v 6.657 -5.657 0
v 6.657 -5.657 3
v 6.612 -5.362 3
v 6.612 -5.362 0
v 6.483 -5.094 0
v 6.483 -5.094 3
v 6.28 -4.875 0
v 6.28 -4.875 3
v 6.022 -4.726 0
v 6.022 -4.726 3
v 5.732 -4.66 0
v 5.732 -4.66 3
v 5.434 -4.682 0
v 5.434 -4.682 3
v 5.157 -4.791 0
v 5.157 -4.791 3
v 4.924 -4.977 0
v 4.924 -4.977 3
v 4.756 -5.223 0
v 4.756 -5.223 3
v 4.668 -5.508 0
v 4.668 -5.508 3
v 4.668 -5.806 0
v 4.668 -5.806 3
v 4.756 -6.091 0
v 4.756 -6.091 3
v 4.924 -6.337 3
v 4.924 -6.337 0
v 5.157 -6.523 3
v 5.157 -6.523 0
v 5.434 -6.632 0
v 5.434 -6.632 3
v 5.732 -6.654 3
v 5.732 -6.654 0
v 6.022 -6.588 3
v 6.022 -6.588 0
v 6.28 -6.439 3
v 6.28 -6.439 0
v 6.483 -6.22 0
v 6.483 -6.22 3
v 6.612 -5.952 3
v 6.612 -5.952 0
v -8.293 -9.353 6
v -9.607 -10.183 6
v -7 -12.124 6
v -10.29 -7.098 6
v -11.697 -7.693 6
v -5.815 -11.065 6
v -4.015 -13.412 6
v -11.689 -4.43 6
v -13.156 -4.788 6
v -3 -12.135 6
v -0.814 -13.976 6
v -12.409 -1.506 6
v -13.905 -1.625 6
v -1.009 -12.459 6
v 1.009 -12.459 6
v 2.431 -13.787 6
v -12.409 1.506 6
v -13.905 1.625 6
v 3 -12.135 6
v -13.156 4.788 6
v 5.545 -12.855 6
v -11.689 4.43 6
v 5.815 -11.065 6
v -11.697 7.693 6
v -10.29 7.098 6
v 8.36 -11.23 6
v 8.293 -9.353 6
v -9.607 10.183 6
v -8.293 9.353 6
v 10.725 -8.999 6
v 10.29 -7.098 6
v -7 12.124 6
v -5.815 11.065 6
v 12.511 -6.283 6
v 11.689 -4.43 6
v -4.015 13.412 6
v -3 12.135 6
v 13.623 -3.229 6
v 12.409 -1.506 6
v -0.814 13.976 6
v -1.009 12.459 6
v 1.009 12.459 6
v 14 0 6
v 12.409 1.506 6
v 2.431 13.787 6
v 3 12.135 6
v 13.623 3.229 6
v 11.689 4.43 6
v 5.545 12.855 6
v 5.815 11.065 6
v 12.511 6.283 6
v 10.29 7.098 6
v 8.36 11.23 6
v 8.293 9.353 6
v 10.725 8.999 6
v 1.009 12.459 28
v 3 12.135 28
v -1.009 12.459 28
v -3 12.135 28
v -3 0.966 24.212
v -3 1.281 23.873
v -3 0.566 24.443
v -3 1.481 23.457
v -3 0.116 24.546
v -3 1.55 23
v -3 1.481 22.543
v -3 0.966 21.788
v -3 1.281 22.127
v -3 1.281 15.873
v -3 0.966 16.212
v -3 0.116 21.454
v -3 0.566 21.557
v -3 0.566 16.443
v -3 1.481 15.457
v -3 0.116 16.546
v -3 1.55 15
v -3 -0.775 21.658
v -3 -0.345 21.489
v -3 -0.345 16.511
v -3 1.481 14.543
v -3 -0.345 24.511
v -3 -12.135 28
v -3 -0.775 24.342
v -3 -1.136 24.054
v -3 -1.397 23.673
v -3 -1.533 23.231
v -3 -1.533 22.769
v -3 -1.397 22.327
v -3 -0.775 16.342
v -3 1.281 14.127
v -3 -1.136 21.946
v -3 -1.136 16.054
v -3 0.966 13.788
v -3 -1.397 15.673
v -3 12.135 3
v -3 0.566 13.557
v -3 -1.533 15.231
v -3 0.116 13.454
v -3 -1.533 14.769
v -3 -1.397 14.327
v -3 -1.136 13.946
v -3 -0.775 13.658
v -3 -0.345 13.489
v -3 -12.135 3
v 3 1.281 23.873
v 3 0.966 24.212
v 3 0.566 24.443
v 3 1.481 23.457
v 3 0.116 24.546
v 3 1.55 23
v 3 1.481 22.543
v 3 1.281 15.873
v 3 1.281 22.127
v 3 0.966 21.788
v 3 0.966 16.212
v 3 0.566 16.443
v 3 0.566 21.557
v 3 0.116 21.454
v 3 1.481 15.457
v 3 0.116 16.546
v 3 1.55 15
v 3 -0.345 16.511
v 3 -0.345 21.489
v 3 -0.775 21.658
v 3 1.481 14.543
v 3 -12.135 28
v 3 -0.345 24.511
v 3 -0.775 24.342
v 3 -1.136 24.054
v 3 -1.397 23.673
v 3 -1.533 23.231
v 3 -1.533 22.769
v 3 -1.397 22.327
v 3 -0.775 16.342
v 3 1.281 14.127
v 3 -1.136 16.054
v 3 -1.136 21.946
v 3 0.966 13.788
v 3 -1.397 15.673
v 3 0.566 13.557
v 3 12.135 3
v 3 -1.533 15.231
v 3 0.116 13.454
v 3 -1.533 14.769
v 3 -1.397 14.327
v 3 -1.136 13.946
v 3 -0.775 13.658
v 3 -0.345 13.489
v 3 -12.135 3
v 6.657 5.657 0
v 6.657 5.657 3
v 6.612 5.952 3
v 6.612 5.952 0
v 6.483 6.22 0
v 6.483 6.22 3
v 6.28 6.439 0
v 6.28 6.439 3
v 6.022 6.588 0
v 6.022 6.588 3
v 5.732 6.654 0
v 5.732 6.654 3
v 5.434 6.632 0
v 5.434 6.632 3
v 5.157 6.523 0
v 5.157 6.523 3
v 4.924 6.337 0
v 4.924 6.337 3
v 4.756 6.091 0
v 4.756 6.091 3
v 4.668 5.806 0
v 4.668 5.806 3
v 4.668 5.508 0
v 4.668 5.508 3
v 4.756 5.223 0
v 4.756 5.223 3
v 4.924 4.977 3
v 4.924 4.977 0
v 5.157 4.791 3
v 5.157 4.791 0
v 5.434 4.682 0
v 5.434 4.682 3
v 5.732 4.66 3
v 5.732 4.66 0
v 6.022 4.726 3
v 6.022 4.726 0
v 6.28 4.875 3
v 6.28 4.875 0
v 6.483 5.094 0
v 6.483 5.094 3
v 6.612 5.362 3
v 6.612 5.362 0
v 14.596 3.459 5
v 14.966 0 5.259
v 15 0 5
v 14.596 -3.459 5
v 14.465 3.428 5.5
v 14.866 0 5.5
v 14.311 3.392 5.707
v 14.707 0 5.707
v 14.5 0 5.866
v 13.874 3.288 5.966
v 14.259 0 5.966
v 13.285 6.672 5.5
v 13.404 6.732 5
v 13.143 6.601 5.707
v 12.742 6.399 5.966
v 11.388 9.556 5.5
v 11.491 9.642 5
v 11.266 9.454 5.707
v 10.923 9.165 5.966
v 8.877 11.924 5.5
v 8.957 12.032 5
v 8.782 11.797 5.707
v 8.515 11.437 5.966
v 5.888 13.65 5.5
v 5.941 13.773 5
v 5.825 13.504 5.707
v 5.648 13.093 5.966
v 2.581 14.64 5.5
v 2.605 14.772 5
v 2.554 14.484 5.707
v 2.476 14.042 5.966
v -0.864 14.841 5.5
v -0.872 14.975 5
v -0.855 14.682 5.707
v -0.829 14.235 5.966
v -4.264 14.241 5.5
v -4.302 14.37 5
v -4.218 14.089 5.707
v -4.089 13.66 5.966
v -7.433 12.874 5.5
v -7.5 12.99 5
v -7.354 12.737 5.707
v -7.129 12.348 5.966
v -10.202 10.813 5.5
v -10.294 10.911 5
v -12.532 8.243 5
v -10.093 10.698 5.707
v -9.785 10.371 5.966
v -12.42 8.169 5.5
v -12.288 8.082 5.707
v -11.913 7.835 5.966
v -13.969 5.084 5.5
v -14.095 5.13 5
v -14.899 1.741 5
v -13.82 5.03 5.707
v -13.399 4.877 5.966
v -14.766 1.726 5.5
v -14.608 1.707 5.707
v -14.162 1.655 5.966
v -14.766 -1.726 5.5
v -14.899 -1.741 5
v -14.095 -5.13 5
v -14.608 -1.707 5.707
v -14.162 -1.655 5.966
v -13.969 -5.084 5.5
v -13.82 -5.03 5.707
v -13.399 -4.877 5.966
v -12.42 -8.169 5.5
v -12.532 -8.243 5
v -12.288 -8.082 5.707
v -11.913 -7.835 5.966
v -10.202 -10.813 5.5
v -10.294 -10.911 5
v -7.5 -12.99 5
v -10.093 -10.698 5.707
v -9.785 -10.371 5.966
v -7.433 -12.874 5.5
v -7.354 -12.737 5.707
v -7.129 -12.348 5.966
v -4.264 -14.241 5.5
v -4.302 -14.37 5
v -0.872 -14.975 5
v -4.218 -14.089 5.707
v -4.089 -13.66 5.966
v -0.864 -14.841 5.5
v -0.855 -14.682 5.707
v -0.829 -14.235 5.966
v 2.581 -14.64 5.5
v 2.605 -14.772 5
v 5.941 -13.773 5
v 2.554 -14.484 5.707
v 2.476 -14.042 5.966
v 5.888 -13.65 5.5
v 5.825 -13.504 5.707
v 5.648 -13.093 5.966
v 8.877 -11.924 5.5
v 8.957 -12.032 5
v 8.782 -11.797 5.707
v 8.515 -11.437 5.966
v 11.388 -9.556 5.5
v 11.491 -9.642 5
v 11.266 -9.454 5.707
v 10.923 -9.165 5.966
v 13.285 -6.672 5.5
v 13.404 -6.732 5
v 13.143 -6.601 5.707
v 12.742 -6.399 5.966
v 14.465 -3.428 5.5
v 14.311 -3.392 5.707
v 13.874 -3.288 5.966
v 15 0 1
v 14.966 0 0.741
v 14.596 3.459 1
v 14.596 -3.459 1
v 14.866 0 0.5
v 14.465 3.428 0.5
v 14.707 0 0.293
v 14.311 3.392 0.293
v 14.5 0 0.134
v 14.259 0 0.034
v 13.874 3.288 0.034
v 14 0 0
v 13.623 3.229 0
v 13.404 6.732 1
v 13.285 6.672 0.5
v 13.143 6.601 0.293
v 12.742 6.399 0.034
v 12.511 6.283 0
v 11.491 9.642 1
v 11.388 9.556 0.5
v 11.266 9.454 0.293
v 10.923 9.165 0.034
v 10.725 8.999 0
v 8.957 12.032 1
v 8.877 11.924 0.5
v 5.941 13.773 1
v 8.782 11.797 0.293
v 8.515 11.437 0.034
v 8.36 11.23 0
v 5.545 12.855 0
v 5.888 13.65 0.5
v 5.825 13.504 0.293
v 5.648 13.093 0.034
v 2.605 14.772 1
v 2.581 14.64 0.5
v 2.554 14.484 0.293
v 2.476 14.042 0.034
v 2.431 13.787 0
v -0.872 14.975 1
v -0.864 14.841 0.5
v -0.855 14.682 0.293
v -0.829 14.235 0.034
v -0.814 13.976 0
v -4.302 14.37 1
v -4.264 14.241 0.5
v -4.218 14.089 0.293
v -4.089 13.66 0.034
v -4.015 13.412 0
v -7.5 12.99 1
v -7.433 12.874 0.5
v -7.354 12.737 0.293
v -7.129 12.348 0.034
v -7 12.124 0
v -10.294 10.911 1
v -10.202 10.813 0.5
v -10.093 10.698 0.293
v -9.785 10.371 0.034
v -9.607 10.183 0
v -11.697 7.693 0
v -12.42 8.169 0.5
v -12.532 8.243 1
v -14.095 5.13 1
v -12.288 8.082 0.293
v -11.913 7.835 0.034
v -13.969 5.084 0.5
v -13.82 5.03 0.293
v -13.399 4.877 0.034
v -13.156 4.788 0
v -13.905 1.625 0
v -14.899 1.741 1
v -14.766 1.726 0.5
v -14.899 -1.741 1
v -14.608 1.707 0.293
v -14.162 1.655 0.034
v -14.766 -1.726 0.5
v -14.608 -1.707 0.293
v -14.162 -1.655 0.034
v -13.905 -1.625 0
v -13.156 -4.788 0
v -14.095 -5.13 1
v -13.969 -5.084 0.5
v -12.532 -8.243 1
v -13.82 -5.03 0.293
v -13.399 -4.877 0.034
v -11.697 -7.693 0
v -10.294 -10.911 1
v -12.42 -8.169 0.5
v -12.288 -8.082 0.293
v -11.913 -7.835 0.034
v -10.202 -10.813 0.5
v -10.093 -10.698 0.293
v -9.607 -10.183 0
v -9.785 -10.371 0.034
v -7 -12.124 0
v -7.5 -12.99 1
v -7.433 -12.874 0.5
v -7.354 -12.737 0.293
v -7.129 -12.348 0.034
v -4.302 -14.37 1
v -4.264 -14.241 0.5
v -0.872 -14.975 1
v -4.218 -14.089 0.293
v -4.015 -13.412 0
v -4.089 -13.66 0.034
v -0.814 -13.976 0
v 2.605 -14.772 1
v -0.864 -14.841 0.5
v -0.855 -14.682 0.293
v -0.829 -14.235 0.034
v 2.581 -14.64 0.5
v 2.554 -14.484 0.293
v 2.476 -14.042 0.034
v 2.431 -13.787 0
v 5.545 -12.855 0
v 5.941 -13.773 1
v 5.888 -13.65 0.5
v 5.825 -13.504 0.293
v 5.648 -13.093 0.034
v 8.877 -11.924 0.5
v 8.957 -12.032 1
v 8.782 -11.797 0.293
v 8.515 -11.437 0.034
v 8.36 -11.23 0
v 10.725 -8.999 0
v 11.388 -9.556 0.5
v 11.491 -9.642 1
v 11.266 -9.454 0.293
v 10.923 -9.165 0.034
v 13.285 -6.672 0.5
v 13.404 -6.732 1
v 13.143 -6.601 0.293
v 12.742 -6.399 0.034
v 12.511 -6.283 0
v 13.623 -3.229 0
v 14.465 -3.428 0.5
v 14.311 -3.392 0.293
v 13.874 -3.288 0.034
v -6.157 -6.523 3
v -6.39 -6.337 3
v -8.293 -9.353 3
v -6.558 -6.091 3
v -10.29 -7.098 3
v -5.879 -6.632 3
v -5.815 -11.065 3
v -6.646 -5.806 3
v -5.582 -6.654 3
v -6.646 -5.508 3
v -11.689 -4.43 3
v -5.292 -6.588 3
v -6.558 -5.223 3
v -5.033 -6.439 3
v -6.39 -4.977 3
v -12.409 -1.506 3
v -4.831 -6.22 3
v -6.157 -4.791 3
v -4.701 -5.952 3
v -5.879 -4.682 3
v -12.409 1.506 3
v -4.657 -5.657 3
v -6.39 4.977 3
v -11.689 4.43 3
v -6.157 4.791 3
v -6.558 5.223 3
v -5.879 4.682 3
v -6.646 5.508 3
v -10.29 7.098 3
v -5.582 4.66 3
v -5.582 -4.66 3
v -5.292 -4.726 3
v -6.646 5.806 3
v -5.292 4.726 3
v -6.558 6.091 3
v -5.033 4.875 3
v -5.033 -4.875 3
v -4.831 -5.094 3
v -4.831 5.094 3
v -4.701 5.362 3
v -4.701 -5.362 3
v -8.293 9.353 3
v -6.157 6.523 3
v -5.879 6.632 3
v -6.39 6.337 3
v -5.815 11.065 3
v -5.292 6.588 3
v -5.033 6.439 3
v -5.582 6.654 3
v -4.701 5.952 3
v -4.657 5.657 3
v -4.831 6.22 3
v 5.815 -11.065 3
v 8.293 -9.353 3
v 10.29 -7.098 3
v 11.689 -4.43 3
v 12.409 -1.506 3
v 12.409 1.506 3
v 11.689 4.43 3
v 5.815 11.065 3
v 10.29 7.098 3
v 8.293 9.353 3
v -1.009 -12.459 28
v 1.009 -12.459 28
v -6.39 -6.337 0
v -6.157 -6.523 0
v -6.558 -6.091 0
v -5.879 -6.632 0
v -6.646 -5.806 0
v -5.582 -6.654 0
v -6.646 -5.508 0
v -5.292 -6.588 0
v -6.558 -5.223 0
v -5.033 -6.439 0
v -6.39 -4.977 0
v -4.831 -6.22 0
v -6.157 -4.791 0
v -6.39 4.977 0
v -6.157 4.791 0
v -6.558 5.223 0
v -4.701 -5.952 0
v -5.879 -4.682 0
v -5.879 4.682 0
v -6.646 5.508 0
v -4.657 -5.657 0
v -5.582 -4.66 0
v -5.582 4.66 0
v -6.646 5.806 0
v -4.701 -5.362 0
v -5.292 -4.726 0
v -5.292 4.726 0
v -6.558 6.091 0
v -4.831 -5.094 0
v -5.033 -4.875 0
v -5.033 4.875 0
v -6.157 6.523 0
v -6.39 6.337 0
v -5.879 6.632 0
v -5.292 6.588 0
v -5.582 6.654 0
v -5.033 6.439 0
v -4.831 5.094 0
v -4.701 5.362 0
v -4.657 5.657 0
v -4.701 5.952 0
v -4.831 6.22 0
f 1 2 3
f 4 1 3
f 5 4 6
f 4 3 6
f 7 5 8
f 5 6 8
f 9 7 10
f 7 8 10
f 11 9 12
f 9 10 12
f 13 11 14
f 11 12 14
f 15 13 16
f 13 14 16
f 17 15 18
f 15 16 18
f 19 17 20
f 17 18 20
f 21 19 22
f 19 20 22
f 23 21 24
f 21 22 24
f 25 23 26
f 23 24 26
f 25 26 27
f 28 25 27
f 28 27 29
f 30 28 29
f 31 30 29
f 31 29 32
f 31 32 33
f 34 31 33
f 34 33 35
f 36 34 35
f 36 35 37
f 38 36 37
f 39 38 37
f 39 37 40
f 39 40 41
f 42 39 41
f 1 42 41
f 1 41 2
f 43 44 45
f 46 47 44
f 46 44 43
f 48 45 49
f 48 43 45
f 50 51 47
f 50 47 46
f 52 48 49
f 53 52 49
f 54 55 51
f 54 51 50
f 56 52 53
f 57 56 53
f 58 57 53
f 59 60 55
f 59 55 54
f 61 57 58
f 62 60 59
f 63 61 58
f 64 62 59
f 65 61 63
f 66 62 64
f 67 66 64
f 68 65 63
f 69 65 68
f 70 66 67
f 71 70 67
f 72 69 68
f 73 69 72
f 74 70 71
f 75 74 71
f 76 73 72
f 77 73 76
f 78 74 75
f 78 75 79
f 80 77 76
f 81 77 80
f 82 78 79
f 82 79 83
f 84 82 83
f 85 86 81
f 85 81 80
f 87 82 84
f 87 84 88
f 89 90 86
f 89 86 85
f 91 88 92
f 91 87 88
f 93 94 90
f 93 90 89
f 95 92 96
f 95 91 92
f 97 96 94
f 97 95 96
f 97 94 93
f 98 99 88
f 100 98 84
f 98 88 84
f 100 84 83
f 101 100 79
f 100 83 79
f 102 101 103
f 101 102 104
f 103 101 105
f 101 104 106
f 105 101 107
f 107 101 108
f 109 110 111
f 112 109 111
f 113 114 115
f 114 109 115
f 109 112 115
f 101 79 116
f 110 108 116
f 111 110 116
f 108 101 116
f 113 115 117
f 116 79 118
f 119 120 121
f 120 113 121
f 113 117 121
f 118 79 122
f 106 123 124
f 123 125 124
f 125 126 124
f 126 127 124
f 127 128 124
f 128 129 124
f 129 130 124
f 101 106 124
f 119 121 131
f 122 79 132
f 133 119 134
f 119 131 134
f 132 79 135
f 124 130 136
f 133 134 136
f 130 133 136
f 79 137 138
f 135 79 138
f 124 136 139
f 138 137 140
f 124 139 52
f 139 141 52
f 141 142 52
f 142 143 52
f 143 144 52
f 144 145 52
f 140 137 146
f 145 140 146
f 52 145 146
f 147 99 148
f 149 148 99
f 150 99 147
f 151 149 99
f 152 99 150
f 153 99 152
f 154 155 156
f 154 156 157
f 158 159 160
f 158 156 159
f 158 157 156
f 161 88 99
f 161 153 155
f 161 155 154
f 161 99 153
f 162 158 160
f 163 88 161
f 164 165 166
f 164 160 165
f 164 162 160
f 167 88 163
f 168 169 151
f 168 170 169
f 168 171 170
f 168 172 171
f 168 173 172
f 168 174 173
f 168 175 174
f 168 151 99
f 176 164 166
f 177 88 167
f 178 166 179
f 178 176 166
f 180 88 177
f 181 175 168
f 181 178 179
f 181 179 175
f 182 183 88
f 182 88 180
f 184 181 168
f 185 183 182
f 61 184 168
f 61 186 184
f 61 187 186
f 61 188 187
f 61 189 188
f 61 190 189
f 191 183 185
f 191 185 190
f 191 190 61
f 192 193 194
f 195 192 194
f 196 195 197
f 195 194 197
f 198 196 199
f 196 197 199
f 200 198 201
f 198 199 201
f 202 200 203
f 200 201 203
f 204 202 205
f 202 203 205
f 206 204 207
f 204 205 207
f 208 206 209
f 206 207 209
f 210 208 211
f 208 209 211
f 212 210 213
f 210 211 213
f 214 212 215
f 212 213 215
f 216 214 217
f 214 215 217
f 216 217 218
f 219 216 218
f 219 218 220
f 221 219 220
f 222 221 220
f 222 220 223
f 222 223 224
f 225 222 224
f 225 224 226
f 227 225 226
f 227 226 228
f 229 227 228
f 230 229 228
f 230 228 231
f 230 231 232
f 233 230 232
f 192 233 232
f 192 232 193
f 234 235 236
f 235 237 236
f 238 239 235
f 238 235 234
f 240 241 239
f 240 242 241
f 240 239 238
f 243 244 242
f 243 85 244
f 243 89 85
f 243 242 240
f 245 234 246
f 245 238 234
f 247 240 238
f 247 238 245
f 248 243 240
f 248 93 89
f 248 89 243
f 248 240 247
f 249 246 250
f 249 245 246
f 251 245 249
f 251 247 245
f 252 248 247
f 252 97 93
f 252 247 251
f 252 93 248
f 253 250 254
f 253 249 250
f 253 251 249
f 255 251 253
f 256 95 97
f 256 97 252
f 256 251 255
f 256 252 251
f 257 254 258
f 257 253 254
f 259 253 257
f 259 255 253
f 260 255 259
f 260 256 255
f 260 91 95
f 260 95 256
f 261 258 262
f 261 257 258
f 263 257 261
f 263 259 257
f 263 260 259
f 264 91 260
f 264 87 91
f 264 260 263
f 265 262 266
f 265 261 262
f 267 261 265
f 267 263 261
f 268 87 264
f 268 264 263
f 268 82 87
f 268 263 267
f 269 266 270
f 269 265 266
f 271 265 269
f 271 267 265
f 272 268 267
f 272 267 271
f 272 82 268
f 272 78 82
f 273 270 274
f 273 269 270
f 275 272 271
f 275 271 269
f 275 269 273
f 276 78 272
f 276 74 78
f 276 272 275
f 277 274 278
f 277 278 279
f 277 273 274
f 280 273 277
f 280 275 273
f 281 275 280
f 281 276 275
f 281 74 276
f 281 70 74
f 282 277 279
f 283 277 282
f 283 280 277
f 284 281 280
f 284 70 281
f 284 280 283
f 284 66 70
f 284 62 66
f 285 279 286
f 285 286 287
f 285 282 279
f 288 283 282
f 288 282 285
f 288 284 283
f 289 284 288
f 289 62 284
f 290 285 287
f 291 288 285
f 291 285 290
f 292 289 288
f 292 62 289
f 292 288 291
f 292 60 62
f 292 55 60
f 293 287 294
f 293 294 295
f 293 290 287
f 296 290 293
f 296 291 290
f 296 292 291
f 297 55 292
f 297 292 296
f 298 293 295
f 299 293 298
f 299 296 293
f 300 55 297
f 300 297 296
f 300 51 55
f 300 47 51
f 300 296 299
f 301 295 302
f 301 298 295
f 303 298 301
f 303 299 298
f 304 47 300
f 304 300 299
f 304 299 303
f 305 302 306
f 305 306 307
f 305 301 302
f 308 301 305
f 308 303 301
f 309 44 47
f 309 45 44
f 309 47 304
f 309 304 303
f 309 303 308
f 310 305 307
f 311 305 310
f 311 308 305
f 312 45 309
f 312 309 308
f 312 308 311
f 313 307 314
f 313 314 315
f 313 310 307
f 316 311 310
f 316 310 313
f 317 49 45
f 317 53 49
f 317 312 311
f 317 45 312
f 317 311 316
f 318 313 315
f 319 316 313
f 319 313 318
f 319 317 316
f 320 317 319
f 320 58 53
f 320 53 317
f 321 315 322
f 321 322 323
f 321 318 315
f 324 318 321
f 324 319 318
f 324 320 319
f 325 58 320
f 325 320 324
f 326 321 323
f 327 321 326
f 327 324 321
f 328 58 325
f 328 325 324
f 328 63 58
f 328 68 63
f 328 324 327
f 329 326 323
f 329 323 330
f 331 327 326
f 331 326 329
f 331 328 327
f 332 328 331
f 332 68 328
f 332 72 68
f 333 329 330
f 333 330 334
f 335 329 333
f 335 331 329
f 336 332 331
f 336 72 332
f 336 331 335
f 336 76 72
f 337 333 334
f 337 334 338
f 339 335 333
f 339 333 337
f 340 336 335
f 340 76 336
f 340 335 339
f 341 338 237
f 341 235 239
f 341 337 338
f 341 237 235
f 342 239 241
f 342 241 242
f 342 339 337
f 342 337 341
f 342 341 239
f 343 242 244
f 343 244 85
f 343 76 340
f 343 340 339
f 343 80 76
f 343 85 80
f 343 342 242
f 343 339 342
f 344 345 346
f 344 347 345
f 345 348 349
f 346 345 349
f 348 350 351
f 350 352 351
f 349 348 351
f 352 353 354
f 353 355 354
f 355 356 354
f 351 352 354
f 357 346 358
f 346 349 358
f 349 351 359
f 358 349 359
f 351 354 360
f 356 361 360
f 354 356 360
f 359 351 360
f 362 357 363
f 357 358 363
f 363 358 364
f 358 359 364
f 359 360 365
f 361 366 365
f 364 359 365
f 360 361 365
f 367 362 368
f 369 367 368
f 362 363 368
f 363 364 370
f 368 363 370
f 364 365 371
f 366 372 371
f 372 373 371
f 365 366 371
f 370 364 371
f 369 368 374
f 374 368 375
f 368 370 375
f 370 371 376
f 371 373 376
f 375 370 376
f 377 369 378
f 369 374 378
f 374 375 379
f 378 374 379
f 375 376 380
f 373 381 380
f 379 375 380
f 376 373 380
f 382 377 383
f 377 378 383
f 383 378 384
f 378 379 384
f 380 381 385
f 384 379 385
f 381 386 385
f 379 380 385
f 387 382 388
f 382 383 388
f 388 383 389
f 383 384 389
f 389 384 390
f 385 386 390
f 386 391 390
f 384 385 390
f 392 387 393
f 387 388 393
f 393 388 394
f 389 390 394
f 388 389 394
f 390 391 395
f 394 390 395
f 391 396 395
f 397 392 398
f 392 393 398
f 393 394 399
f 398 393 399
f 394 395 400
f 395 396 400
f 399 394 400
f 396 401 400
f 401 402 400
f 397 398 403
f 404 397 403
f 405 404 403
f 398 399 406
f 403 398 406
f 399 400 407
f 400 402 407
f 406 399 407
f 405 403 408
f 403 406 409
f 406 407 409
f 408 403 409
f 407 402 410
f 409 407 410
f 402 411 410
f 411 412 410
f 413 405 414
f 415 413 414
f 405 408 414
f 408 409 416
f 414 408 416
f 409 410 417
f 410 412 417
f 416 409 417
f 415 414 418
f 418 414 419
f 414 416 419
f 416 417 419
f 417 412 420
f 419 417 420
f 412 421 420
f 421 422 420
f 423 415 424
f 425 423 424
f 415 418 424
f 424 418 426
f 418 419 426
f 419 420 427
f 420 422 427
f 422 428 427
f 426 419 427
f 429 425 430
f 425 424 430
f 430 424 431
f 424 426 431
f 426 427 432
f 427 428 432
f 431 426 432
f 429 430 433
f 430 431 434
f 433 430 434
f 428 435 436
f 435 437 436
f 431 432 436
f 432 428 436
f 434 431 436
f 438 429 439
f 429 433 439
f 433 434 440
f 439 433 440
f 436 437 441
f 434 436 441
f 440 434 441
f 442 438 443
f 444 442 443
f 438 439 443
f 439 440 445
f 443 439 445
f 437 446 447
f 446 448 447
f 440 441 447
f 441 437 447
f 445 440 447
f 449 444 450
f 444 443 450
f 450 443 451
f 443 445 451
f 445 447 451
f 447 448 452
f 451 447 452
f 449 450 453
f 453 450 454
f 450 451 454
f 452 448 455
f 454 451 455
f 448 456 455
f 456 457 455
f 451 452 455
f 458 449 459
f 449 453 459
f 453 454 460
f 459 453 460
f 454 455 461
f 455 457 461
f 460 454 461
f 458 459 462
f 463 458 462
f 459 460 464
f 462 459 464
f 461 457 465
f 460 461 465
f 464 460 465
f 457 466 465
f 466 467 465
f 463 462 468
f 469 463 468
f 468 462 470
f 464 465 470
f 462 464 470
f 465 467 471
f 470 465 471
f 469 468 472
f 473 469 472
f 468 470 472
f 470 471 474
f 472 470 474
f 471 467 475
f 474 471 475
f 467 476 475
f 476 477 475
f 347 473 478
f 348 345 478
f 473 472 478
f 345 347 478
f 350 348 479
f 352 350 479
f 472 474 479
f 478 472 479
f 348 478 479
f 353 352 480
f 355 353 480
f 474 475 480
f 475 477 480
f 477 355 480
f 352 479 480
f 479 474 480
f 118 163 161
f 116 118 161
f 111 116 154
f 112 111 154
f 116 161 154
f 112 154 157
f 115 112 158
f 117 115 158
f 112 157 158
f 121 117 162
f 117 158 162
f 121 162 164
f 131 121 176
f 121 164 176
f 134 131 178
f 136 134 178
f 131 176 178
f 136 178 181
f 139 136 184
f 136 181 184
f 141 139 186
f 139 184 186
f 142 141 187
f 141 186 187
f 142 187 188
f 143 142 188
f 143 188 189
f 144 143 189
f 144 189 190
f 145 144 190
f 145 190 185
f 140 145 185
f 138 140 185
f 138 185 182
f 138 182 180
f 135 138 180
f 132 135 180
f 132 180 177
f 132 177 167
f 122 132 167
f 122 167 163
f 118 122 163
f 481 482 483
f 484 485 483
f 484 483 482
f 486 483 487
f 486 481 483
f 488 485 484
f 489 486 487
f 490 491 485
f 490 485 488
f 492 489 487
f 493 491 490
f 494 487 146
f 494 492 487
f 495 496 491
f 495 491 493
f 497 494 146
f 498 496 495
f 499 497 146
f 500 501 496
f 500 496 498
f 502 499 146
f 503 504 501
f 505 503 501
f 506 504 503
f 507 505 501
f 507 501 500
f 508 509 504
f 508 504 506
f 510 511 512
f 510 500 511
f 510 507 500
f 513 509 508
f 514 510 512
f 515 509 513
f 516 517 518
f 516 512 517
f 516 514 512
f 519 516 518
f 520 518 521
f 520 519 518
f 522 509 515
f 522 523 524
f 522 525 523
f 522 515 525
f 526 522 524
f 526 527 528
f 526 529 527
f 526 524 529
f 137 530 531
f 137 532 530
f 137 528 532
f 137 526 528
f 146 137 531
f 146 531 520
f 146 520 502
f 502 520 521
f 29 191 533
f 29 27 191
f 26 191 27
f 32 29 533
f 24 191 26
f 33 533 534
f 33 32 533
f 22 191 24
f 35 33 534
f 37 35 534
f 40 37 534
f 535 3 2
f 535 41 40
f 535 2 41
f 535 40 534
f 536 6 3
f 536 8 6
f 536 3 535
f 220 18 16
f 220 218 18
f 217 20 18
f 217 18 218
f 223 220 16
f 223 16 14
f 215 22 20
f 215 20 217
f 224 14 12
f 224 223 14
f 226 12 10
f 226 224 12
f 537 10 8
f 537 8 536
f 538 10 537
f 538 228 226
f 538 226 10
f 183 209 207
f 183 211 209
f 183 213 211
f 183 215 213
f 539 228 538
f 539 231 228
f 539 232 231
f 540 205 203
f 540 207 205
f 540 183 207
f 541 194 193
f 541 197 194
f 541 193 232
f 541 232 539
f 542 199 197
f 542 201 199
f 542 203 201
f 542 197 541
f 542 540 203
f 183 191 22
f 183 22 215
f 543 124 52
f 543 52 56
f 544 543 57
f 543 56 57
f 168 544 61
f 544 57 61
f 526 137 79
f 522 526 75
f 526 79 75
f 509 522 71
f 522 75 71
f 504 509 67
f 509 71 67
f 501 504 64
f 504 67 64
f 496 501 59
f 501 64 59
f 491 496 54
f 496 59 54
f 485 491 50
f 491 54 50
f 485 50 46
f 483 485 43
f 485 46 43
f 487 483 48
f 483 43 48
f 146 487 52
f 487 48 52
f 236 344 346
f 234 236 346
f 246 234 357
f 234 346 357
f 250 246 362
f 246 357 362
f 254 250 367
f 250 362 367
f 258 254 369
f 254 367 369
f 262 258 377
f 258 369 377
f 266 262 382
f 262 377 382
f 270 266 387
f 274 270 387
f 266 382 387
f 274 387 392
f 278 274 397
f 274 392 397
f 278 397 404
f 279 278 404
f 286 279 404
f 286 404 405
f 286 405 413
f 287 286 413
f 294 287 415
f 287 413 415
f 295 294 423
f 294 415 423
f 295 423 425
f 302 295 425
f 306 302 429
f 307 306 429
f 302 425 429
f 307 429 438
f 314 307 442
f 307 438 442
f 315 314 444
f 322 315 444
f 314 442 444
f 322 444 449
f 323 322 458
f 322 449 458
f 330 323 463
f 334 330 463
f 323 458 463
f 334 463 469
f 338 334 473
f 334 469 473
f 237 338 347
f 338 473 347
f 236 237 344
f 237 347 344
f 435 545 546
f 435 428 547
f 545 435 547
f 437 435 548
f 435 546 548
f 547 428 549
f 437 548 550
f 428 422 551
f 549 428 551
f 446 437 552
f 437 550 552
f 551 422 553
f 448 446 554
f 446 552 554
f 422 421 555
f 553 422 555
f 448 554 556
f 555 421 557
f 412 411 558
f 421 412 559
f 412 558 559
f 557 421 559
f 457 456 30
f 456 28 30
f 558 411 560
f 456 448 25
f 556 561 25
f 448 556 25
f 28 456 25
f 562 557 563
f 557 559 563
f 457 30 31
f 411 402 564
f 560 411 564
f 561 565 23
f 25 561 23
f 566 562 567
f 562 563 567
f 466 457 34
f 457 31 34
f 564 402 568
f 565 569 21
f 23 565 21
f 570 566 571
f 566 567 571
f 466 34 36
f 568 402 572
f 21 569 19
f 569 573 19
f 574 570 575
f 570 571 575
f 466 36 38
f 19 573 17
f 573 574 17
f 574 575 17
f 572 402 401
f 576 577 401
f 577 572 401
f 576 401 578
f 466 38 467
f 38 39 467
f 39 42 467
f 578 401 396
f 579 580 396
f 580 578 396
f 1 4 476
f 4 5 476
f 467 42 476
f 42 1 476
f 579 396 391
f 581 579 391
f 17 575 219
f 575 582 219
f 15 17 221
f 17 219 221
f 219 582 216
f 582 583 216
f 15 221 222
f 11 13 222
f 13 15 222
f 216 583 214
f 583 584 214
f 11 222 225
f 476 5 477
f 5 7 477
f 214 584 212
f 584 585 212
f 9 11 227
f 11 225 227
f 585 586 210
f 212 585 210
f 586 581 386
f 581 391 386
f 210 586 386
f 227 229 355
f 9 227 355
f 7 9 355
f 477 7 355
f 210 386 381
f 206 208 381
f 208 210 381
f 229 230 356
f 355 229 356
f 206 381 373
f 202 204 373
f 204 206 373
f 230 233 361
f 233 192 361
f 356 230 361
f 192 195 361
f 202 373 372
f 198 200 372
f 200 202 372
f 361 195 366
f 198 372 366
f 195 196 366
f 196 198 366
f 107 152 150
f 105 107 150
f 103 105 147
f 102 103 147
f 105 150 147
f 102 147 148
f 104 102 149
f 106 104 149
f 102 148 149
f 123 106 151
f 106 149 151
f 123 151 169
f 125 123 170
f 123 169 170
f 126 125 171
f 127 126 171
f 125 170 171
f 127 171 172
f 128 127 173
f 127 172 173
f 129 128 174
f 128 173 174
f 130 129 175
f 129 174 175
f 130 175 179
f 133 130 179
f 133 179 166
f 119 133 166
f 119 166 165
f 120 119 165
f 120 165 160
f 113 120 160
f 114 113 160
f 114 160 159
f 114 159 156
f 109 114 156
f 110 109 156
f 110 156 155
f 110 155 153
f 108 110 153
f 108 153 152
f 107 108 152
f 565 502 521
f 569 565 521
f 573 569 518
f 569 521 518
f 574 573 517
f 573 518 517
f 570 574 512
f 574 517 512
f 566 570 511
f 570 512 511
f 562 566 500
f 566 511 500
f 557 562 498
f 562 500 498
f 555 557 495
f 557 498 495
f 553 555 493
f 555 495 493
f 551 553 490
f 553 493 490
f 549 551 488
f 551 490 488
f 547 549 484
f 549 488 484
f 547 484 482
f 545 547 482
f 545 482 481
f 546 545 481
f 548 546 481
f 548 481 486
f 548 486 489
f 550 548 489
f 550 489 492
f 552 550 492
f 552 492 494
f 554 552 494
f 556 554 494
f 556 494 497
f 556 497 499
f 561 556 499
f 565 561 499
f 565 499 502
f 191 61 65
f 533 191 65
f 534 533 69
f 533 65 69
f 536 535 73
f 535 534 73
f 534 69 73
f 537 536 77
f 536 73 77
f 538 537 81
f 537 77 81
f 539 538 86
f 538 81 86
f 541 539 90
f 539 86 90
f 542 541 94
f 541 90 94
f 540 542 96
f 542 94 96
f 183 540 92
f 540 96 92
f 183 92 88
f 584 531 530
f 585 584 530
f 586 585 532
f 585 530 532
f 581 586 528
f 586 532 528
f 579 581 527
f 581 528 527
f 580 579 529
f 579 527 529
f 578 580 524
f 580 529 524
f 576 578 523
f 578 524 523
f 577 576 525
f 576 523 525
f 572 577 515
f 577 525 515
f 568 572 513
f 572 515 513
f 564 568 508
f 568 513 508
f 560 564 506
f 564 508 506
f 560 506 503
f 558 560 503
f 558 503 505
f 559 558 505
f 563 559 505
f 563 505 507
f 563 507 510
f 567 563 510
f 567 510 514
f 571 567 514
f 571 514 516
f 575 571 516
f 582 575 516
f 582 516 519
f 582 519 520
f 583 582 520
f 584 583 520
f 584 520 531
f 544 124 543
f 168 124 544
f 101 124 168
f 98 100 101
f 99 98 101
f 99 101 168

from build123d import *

# Parameters (mm, degrees)
SKETCH_R        = 15
PAD_DEPTH       = 6
FILLET_R        = 1
FILLET001_R     = 1
SKETCH001_R     = 12.5
POCKET_DEPTH    = 3
PAD001_DEPTH    = 25
SKETCH003_R     = 1.55
POCKET001_DEPTH = 20
SKETCH004_R     = 1
POCKET002_DEPTH = 6


with BuildPart() as part:
    # Sketch → Pad (new body)
    with BuildSketch(Plane.XY):
        Circle(SKETCH_R)
    extrude(amount=PAD_DEPTH)

    # Fillet
    fillet_edges = [part.edges().sort_by_distance(p)[0] for p in [
        (-15, 0, 0),
    ]]
    fillet(fillet_edges, radius=FILLET_R)

    # Fillet001
    fillet001_edges = [part.edges().sort_by_distance(p)[0] for p in [
        (-15, 0, 6),
    ]]
    fillet(fillet001_edges, radius=FILLET001_R)

    # Sketch001 (on Face4 of Fillet001) → Pocket (cut)
    with BuildSketch(Plane.XY.offset(6)):
        Circle(SKETCH001_R)
    extrude(amount=-POCKET_DEPTH, mode=Mode.SUBTRACT)

    # Sketch002 (on Face7 of Pocket) → Pad001 (join)
    with BuildSketch(Plane.XY.offset(3)):
        with BuildLine():
            Line((-3, 12.134661), (-3, -12.134661))
            ThreePointArc((-3, -12.134661), (0, -12.5), (3, -12.134661))
            Line((3, 12.134661), (3, -12.134661))
            ThreePointArc((3, 12.134661), (0, 12.5), (-3, 12.134661))
        make_face()
    extrude(amount=PAD001_DEPTH)

    # Sketch003 (on Face11 of Pad001) → Pocket001 (cut)
    with BuildSketch(Plane.YZ.offset(3)):
        with Locations((0, 23)):
            Circle(SKETCH003_R)
        with Locations((0, 15)):
            Circle(SKETCH003_R)
    extrude(amount=-POCKET001_DEPTH, mode=Mode.SUBTRACT)

    # Sketch004 (on Face3 of Pad) → Pocket002 (cut)
    with BuildSketch(Plane.XY.offset(6)):
        with Locations((-5.656854, 5.656854)):
            Circle(SKETCH004_R)
        with Locations((5.656854, 5.656854)):
            Circle(SKETCH004_R)
        with Locations((-5.656854, -5.656854)):
            Circle(SKETCH004_R)
        with Locations((5.656854, -5.656854)):
            Circle(SKETCH004_R)
    extrude(amount=-POCKET002_DEPTH, mode=Mode.SUBTRACT)


solid = part.part
